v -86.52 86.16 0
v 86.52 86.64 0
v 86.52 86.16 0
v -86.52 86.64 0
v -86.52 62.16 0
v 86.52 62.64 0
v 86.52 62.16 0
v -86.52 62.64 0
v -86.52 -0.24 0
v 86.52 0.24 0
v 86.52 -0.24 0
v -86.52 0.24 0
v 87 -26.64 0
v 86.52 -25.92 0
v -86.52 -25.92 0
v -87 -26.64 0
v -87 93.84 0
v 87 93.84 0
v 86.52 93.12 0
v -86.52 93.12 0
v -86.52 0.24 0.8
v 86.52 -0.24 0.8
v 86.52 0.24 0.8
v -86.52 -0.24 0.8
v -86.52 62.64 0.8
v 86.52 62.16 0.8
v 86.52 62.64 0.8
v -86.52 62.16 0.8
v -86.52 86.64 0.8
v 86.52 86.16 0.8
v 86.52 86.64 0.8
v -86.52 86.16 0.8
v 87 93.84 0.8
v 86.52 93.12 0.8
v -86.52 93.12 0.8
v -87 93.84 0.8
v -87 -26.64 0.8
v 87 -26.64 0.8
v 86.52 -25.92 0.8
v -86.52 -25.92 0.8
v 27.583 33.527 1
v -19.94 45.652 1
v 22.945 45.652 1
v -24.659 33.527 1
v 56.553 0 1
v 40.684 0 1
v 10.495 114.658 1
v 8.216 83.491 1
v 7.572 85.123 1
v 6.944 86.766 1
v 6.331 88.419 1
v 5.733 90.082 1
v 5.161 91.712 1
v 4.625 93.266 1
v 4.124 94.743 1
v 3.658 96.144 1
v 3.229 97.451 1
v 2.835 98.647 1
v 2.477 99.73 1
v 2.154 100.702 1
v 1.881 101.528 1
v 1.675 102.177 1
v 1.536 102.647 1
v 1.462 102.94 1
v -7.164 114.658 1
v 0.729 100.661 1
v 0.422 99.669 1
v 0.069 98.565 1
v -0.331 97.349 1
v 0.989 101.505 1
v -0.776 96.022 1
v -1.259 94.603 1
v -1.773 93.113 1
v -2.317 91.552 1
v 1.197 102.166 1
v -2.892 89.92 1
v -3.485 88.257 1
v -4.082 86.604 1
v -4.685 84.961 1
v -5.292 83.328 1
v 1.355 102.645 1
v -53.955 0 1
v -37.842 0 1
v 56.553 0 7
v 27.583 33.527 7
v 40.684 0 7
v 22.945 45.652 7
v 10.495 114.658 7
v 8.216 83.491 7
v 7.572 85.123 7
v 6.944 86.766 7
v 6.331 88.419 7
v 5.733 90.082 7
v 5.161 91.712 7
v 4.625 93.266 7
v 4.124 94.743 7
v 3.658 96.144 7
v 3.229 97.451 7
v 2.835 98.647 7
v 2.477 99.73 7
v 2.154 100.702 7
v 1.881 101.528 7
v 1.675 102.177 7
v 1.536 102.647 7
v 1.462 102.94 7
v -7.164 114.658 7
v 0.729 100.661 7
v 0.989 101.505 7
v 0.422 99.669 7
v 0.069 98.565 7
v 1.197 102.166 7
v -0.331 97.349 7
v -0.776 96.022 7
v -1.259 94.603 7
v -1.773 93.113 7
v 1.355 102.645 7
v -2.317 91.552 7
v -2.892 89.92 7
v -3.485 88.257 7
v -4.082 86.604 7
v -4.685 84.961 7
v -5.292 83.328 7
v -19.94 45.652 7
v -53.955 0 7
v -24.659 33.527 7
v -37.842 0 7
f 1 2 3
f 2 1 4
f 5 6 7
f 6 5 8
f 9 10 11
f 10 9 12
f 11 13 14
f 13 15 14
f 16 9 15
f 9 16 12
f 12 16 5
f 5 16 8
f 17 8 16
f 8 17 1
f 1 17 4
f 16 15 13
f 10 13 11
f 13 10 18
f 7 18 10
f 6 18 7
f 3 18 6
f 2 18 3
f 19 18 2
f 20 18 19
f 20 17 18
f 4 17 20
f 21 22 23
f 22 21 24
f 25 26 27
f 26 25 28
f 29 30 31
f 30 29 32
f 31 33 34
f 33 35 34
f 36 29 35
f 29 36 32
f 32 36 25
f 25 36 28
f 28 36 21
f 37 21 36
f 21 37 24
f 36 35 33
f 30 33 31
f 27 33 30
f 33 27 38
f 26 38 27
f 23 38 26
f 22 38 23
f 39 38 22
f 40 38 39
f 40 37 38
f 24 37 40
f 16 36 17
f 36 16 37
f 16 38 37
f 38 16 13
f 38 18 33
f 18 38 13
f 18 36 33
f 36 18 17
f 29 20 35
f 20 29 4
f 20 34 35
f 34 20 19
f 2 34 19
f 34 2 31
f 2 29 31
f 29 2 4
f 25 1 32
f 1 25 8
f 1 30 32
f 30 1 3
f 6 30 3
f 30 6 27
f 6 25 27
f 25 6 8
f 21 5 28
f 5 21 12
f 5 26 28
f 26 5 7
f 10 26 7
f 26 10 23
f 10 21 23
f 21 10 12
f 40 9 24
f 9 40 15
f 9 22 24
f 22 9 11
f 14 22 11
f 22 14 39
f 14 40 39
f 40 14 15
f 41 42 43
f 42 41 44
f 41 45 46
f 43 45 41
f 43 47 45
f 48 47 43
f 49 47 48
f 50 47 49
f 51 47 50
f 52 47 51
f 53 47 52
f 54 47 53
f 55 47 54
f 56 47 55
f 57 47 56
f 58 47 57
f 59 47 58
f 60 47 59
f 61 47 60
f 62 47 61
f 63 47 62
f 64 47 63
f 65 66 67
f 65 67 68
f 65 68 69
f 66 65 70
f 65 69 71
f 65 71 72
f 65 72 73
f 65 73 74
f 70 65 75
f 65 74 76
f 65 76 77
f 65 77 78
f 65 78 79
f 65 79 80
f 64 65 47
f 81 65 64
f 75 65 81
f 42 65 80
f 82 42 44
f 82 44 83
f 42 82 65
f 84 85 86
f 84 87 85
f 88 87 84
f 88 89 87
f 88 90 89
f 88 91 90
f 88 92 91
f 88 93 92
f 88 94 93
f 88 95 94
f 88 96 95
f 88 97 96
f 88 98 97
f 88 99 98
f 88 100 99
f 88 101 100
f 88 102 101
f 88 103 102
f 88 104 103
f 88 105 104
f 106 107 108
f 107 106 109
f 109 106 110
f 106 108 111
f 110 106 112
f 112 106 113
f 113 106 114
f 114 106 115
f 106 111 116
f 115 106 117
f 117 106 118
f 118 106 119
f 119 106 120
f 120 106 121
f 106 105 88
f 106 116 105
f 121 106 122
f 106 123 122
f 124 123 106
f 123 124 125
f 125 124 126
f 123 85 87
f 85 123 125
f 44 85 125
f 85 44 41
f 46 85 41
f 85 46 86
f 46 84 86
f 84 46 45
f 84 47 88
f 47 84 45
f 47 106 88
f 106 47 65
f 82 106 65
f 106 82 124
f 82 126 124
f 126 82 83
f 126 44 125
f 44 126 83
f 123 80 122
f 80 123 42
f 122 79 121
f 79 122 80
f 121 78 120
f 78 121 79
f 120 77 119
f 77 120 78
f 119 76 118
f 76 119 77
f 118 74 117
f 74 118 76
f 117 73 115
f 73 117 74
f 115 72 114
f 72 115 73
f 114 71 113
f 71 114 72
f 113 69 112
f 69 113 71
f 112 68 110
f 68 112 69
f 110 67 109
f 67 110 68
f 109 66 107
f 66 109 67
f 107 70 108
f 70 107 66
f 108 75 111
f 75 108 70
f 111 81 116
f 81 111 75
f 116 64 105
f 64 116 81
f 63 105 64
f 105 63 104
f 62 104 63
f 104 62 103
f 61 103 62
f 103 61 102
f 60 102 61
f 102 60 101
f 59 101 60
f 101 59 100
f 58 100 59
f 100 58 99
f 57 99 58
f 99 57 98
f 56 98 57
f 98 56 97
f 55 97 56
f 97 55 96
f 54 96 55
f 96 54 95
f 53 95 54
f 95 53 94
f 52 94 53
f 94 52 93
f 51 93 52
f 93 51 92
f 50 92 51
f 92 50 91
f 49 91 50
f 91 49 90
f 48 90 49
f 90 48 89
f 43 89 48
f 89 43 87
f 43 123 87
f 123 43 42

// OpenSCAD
//////////////////////////////////////////////////////////////////////
// LibFile: glyph_observation.scad
// Project: Glyph Dossier
// FileGroup: Executable Workbench
// FileSummary: Manual source-specific glyph observation candidate.
//////////////////////////////////////////////////////////////////////

/* [Character and source] */
glyph_id_selected = "U_A";
source_id_selected = "SRC_1"; // [SRC_1,SRC_2,SRC_3]

/* [Source 1] */
source_1_label = "Source 1";
source_1_font_name = "";
source_1_license = "unrecorded";
source_1_url = "";
source_1_revision = "";

/* [Source 2] */
source_2_label = "Source 2";
source_2_font_name = "";
source_2_license = "unrecorded";
source_2_url = "";
source_2_revision = "";

/* [Source 3] */
source_3_label = "Source 3";
source_3_font_name = "";
source_3_license = "unrecorded";
source_3_url = "";
source_3_revision = "";


/* [Observation record] */
observed_status = "pending"; // [pending,observed,verified]
observed_variant = "unobserved";
observed_components = -999999;
observed_counters = -999999;
observed_left_extent = -999999;
observed_right_extent = -999999;
observed_bottom_extent = -999999;
observed_top_extent = -999999;
observed_minimum_stroke = -999999;
observed_minimum_gap = -999999;
observation_note = "Awaiting source-specific inspection.";

/* [Stroke probe] */
stroke_probe_x = 0;
stroke_probe_y = 45;
stroke_probe_orientation = "vertical"; // [vertical,horizontal]
stroke_probe_length = 30;

/* [Gap probe] */
gap_probe_x = 0;
gap_probe_y = 25;
gap_probe_orientation = "horizontal"; // [horizontal,vertical]
gap_probe_length = 30;

/* [Profile] */
nominal_size = 120;
extrusion_depth = 6;

/* [Guides] */
guide_depth = 0.8;
show_guides = true;
show_frame = true;
show_manual_guides = true;
x_height_ratio = 0.52;
cap_height_ratio = 0.72;
ascender_ratio = 0.78;
descender_ratio = 0.22;

/* [Hidden] */
workbench_name = "glyph_observation";
project_name_selected = "GLYPH_DOSSIER_LAB";
render_mode = "observation";
report_level = "full";
source_kind = "font";

include <../main.scad>
